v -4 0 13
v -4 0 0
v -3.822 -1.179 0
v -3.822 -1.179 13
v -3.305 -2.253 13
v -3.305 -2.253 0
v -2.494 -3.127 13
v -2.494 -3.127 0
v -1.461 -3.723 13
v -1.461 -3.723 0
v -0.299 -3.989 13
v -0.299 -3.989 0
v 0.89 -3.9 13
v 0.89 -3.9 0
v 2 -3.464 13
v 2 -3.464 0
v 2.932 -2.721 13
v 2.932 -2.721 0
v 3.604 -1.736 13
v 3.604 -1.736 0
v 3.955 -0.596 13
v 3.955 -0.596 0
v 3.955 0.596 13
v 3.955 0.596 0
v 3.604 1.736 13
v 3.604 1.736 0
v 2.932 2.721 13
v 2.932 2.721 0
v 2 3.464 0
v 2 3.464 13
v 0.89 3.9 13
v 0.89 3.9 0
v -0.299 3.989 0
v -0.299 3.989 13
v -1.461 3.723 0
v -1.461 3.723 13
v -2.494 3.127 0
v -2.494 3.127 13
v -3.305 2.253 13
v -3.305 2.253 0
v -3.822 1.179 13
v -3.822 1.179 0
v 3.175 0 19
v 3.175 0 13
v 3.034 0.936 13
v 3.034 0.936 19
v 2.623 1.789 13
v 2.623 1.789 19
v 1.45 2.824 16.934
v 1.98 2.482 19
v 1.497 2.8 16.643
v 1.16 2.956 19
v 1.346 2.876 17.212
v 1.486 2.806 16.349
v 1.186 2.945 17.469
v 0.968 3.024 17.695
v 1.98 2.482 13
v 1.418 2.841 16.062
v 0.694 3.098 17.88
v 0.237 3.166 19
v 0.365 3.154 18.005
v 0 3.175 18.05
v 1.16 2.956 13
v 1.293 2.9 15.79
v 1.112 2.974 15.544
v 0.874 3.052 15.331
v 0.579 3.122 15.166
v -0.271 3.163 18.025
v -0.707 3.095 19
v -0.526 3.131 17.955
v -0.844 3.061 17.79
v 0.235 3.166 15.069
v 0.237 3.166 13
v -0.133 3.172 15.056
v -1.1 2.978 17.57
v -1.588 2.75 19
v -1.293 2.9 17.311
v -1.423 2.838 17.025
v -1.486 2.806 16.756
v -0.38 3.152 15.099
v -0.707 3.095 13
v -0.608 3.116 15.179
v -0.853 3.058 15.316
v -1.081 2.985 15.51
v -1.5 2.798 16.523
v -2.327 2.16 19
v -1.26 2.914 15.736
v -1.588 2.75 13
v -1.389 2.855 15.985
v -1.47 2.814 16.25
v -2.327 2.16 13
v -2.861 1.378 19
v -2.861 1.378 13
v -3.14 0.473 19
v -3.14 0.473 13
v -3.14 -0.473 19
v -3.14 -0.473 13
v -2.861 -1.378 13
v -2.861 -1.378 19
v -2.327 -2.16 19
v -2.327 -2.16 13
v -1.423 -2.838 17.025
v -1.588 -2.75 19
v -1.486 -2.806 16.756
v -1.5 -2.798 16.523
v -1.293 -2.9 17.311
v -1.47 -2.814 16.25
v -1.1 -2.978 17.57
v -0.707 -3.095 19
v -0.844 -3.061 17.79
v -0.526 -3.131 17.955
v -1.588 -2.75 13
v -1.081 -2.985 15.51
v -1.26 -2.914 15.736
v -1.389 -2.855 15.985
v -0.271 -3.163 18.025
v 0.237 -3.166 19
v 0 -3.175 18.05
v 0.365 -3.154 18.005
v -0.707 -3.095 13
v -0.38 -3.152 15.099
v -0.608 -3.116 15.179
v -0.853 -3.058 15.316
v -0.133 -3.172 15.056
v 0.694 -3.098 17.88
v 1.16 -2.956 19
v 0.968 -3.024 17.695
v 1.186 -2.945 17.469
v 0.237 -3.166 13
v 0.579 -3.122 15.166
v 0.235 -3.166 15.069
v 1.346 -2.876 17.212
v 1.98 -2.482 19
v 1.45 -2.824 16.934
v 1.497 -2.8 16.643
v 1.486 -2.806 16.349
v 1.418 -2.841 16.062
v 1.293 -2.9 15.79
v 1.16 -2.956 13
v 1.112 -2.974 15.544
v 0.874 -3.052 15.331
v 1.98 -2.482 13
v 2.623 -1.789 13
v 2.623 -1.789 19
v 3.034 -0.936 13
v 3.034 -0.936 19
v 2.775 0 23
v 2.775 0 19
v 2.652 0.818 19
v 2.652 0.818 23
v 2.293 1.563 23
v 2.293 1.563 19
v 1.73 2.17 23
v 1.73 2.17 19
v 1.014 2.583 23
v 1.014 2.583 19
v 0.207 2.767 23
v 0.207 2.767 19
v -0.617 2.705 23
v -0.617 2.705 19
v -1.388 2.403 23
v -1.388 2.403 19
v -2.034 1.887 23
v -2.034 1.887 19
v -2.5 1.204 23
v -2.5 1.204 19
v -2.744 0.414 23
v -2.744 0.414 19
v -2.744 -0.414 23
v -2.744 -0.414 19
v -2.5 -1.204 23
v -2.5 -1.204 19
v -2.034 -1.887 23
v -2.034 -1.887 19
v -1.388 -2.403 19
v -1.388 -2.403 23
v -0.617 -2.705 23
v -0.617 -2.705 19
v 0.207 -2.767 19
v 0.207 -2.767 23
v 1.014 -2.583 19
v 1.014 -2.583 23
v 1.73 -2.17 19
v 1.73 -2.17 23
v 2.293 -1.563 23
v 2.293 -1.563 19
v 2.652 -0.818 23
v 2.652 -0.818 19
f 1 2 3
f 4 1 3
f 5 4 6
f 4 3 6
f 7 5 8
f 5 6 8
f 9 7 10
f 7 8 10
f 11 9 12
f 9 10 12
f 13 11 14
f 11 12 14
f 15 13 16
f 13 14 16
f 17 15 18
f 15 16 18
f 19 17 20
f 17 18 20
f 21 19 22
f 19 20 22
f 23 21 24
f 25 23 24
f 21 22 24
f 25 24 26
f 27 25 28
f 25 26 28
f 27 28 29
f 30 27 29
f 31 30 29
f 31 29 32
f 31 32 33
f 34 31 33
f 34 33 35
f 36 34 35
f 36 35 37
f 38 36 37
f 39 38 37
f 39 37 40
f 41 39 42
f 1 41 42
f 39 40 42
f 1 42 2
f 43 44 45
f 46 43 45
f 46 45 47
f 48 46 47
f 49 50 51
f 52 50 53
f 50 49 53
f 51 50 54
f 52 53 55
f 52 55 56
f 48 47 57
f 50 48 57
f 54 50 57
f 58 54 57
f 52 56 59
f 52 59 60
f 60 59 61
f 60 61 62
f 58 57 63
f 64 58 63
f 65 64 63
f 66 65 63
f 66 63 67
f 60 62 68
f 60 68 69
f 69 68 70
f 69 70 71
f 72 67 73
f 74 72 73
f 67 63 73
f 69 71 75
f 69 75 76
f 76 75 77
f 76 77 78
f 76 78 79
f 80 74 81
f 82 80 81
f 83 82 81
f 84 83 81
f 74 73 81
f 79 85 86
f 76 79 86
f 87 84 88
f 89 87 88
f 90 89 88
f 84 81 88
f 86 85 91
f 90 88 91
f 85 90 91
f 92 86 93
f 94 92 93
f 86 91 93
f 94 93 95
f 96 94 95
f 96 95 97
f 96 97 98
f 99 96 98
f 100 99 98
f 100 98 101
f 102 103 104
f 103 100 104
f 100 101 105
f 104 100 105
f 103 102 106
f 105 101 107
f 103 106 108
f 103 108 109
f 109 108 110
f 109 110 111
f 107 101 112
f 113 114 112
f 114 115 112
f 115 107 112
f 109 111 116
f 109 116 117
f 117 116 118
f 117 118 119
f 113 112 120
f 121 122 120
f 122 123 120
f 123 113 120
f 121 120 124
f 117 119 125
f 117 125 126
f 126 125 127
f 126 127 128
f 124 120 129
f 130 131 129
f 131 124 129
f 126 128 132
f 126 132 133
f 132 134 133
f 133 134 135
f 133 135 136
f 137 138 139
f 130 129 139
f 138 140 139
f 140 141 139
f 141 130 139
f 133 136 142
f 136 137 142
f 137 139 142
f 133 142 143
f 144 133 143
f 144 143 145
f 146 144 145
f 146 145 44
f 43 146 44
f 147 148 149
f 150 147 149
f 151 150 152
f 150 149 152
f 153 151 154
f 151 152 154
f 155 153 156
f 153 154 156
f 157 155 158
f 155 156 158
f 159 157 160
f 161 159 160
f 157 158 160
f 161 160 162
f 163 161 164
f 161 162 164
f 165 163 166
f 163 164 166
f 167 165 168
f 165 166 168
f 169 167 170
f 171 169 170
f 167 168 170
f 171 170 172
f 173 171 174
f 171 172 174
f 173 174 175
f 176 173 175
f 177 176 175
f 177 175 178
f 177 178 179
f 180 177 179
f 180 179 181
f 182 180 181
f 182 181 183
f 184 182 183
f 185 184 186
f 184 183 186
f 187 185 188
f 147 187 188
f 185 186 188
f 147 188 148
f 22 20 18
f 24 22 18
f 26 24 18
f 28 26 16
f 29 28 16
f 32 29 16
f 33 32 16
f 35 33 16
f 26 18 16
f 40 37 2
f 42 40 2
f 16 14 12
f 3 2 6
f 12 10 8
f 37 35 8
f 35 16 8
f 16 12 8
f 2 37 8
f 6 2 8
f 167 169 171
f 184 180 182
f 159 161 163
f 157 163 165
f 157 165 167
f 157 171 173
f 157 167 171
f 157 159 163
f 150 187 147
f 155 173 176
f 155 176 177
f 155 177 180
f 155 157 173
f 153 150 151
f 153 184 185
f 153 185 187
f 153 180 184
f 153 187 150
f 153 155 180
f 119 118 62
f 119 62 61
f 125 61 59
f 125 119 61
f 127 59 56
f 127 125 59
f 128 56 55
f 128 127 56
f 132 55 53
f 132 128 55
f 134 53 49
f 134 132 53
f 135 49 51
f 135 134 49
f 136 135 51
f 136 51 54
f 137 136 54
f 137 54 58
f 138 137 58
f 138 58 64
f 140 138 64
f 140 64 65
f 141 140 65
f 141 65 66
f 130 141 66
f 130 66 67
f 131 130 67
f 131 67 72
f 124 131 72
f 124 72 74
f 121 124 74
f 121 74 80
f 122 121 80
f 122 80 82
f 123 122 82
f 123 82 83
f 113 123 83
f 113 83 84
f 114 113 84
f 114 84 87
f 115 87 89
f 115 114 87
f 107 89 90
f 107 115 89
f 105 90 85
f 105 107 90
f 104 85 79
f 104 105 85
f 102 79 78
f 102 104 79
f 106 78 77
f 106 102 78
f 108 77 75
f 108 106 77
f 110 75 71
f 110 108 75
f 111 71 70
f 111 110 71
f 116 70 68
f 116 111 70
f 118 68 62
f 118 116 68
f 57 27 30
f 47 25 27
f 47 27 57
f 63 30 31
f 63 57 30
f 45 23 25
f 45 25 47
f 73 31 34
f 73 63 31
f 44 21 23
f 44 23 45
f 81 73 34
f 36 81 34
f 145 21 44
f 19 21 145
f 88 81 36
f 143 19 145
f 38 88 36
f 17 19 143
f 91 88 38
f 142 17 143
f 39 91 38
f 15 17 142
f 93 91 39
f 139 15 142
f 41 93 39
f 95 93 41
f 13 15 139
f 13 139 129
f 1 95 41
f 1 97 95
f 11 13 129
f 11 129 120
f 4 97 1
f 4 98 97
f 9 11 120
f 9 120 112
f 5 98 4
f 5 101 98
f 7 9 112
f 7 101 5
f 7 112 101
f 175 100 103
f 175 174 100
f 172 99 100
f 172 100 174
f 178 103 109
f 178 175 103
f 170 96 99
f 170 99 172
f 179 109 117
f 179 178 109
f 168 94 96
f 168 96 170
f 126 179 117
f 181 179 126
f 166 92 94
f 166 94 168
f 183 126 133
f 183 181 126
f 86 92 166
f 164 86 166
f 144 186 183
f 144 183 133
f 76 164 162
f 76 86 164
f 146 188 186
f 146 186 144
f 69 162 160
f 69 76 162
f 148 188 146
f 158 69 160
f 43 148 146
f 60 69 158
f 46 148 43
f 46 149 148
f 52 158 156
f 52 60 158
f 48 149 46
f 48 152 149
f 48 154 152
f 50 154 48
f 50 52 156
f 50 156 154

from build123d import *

# Parameters (mm, degrees)
SKETCH1_R               = 4
BOSS_EXTRUDE2_DEPTH     = 13
SKETCH2_R               = 3.175
BOSS_EXTRUDE3_DEPTH     = 6
SKETCH3_R               = 2.775
BOSS_EXTRUDE4_DEPTH     = 4
CUT_EXTRUDE1_DEPTH      = 24.685438565
CUT_EXTRUDE1_DEPTH_BACK = 24.685438565
SKETCH4_R               = 1.5


with BuildPart() as part:
    # Sketch1 → Boss-Extrude2 (new body)
    with BuildSketch(Plane.XY):
        with Locations(Location((0, 0, 0), (0, 0, 180))):
            Circle(SKETCH1_R)
    extrude(amount=BOSS_EXTRUDE2_DEPTH)

    # Sketch2 → Boss-Extrude3 (add)
    with BuildSketch(Plane.XY.offset(13)):
        Circle(SKETCH2_R)
    extrude(amount=BOSS_EXTRUDE3_DEPTH)

    # Sketch3 → Boss-Extrude4 (add)
    with BuildSketch(Plane.XY.offset(19)):
        Circle(SKETCH3_R)
    extrude(amount=BOSS_EXTRUDE4_DEPTH)

    # Sketch4 → Cut-Extrude1 (cut, two sides: drawn at the far end of the back side and taken through both)
    with BuildSketch(Plane(origin=(0, 0, 0), x_dir=(1, 0, 0), z_dir=(0, 1, 0)).offset(-CUT_EXTRUDE1_DEPTH_BACK)):
        with Locations(Location((0, -16.55, 0), (0, 0, 270))):
            Circle(SKETCH4_R)
    extrude(amount=CUT_EXTRUDE1_DEPTH + CUT_EXTRUDE1_DEPTH_BACK, mode=Mode.SUBTRACT)


solid = part.part
